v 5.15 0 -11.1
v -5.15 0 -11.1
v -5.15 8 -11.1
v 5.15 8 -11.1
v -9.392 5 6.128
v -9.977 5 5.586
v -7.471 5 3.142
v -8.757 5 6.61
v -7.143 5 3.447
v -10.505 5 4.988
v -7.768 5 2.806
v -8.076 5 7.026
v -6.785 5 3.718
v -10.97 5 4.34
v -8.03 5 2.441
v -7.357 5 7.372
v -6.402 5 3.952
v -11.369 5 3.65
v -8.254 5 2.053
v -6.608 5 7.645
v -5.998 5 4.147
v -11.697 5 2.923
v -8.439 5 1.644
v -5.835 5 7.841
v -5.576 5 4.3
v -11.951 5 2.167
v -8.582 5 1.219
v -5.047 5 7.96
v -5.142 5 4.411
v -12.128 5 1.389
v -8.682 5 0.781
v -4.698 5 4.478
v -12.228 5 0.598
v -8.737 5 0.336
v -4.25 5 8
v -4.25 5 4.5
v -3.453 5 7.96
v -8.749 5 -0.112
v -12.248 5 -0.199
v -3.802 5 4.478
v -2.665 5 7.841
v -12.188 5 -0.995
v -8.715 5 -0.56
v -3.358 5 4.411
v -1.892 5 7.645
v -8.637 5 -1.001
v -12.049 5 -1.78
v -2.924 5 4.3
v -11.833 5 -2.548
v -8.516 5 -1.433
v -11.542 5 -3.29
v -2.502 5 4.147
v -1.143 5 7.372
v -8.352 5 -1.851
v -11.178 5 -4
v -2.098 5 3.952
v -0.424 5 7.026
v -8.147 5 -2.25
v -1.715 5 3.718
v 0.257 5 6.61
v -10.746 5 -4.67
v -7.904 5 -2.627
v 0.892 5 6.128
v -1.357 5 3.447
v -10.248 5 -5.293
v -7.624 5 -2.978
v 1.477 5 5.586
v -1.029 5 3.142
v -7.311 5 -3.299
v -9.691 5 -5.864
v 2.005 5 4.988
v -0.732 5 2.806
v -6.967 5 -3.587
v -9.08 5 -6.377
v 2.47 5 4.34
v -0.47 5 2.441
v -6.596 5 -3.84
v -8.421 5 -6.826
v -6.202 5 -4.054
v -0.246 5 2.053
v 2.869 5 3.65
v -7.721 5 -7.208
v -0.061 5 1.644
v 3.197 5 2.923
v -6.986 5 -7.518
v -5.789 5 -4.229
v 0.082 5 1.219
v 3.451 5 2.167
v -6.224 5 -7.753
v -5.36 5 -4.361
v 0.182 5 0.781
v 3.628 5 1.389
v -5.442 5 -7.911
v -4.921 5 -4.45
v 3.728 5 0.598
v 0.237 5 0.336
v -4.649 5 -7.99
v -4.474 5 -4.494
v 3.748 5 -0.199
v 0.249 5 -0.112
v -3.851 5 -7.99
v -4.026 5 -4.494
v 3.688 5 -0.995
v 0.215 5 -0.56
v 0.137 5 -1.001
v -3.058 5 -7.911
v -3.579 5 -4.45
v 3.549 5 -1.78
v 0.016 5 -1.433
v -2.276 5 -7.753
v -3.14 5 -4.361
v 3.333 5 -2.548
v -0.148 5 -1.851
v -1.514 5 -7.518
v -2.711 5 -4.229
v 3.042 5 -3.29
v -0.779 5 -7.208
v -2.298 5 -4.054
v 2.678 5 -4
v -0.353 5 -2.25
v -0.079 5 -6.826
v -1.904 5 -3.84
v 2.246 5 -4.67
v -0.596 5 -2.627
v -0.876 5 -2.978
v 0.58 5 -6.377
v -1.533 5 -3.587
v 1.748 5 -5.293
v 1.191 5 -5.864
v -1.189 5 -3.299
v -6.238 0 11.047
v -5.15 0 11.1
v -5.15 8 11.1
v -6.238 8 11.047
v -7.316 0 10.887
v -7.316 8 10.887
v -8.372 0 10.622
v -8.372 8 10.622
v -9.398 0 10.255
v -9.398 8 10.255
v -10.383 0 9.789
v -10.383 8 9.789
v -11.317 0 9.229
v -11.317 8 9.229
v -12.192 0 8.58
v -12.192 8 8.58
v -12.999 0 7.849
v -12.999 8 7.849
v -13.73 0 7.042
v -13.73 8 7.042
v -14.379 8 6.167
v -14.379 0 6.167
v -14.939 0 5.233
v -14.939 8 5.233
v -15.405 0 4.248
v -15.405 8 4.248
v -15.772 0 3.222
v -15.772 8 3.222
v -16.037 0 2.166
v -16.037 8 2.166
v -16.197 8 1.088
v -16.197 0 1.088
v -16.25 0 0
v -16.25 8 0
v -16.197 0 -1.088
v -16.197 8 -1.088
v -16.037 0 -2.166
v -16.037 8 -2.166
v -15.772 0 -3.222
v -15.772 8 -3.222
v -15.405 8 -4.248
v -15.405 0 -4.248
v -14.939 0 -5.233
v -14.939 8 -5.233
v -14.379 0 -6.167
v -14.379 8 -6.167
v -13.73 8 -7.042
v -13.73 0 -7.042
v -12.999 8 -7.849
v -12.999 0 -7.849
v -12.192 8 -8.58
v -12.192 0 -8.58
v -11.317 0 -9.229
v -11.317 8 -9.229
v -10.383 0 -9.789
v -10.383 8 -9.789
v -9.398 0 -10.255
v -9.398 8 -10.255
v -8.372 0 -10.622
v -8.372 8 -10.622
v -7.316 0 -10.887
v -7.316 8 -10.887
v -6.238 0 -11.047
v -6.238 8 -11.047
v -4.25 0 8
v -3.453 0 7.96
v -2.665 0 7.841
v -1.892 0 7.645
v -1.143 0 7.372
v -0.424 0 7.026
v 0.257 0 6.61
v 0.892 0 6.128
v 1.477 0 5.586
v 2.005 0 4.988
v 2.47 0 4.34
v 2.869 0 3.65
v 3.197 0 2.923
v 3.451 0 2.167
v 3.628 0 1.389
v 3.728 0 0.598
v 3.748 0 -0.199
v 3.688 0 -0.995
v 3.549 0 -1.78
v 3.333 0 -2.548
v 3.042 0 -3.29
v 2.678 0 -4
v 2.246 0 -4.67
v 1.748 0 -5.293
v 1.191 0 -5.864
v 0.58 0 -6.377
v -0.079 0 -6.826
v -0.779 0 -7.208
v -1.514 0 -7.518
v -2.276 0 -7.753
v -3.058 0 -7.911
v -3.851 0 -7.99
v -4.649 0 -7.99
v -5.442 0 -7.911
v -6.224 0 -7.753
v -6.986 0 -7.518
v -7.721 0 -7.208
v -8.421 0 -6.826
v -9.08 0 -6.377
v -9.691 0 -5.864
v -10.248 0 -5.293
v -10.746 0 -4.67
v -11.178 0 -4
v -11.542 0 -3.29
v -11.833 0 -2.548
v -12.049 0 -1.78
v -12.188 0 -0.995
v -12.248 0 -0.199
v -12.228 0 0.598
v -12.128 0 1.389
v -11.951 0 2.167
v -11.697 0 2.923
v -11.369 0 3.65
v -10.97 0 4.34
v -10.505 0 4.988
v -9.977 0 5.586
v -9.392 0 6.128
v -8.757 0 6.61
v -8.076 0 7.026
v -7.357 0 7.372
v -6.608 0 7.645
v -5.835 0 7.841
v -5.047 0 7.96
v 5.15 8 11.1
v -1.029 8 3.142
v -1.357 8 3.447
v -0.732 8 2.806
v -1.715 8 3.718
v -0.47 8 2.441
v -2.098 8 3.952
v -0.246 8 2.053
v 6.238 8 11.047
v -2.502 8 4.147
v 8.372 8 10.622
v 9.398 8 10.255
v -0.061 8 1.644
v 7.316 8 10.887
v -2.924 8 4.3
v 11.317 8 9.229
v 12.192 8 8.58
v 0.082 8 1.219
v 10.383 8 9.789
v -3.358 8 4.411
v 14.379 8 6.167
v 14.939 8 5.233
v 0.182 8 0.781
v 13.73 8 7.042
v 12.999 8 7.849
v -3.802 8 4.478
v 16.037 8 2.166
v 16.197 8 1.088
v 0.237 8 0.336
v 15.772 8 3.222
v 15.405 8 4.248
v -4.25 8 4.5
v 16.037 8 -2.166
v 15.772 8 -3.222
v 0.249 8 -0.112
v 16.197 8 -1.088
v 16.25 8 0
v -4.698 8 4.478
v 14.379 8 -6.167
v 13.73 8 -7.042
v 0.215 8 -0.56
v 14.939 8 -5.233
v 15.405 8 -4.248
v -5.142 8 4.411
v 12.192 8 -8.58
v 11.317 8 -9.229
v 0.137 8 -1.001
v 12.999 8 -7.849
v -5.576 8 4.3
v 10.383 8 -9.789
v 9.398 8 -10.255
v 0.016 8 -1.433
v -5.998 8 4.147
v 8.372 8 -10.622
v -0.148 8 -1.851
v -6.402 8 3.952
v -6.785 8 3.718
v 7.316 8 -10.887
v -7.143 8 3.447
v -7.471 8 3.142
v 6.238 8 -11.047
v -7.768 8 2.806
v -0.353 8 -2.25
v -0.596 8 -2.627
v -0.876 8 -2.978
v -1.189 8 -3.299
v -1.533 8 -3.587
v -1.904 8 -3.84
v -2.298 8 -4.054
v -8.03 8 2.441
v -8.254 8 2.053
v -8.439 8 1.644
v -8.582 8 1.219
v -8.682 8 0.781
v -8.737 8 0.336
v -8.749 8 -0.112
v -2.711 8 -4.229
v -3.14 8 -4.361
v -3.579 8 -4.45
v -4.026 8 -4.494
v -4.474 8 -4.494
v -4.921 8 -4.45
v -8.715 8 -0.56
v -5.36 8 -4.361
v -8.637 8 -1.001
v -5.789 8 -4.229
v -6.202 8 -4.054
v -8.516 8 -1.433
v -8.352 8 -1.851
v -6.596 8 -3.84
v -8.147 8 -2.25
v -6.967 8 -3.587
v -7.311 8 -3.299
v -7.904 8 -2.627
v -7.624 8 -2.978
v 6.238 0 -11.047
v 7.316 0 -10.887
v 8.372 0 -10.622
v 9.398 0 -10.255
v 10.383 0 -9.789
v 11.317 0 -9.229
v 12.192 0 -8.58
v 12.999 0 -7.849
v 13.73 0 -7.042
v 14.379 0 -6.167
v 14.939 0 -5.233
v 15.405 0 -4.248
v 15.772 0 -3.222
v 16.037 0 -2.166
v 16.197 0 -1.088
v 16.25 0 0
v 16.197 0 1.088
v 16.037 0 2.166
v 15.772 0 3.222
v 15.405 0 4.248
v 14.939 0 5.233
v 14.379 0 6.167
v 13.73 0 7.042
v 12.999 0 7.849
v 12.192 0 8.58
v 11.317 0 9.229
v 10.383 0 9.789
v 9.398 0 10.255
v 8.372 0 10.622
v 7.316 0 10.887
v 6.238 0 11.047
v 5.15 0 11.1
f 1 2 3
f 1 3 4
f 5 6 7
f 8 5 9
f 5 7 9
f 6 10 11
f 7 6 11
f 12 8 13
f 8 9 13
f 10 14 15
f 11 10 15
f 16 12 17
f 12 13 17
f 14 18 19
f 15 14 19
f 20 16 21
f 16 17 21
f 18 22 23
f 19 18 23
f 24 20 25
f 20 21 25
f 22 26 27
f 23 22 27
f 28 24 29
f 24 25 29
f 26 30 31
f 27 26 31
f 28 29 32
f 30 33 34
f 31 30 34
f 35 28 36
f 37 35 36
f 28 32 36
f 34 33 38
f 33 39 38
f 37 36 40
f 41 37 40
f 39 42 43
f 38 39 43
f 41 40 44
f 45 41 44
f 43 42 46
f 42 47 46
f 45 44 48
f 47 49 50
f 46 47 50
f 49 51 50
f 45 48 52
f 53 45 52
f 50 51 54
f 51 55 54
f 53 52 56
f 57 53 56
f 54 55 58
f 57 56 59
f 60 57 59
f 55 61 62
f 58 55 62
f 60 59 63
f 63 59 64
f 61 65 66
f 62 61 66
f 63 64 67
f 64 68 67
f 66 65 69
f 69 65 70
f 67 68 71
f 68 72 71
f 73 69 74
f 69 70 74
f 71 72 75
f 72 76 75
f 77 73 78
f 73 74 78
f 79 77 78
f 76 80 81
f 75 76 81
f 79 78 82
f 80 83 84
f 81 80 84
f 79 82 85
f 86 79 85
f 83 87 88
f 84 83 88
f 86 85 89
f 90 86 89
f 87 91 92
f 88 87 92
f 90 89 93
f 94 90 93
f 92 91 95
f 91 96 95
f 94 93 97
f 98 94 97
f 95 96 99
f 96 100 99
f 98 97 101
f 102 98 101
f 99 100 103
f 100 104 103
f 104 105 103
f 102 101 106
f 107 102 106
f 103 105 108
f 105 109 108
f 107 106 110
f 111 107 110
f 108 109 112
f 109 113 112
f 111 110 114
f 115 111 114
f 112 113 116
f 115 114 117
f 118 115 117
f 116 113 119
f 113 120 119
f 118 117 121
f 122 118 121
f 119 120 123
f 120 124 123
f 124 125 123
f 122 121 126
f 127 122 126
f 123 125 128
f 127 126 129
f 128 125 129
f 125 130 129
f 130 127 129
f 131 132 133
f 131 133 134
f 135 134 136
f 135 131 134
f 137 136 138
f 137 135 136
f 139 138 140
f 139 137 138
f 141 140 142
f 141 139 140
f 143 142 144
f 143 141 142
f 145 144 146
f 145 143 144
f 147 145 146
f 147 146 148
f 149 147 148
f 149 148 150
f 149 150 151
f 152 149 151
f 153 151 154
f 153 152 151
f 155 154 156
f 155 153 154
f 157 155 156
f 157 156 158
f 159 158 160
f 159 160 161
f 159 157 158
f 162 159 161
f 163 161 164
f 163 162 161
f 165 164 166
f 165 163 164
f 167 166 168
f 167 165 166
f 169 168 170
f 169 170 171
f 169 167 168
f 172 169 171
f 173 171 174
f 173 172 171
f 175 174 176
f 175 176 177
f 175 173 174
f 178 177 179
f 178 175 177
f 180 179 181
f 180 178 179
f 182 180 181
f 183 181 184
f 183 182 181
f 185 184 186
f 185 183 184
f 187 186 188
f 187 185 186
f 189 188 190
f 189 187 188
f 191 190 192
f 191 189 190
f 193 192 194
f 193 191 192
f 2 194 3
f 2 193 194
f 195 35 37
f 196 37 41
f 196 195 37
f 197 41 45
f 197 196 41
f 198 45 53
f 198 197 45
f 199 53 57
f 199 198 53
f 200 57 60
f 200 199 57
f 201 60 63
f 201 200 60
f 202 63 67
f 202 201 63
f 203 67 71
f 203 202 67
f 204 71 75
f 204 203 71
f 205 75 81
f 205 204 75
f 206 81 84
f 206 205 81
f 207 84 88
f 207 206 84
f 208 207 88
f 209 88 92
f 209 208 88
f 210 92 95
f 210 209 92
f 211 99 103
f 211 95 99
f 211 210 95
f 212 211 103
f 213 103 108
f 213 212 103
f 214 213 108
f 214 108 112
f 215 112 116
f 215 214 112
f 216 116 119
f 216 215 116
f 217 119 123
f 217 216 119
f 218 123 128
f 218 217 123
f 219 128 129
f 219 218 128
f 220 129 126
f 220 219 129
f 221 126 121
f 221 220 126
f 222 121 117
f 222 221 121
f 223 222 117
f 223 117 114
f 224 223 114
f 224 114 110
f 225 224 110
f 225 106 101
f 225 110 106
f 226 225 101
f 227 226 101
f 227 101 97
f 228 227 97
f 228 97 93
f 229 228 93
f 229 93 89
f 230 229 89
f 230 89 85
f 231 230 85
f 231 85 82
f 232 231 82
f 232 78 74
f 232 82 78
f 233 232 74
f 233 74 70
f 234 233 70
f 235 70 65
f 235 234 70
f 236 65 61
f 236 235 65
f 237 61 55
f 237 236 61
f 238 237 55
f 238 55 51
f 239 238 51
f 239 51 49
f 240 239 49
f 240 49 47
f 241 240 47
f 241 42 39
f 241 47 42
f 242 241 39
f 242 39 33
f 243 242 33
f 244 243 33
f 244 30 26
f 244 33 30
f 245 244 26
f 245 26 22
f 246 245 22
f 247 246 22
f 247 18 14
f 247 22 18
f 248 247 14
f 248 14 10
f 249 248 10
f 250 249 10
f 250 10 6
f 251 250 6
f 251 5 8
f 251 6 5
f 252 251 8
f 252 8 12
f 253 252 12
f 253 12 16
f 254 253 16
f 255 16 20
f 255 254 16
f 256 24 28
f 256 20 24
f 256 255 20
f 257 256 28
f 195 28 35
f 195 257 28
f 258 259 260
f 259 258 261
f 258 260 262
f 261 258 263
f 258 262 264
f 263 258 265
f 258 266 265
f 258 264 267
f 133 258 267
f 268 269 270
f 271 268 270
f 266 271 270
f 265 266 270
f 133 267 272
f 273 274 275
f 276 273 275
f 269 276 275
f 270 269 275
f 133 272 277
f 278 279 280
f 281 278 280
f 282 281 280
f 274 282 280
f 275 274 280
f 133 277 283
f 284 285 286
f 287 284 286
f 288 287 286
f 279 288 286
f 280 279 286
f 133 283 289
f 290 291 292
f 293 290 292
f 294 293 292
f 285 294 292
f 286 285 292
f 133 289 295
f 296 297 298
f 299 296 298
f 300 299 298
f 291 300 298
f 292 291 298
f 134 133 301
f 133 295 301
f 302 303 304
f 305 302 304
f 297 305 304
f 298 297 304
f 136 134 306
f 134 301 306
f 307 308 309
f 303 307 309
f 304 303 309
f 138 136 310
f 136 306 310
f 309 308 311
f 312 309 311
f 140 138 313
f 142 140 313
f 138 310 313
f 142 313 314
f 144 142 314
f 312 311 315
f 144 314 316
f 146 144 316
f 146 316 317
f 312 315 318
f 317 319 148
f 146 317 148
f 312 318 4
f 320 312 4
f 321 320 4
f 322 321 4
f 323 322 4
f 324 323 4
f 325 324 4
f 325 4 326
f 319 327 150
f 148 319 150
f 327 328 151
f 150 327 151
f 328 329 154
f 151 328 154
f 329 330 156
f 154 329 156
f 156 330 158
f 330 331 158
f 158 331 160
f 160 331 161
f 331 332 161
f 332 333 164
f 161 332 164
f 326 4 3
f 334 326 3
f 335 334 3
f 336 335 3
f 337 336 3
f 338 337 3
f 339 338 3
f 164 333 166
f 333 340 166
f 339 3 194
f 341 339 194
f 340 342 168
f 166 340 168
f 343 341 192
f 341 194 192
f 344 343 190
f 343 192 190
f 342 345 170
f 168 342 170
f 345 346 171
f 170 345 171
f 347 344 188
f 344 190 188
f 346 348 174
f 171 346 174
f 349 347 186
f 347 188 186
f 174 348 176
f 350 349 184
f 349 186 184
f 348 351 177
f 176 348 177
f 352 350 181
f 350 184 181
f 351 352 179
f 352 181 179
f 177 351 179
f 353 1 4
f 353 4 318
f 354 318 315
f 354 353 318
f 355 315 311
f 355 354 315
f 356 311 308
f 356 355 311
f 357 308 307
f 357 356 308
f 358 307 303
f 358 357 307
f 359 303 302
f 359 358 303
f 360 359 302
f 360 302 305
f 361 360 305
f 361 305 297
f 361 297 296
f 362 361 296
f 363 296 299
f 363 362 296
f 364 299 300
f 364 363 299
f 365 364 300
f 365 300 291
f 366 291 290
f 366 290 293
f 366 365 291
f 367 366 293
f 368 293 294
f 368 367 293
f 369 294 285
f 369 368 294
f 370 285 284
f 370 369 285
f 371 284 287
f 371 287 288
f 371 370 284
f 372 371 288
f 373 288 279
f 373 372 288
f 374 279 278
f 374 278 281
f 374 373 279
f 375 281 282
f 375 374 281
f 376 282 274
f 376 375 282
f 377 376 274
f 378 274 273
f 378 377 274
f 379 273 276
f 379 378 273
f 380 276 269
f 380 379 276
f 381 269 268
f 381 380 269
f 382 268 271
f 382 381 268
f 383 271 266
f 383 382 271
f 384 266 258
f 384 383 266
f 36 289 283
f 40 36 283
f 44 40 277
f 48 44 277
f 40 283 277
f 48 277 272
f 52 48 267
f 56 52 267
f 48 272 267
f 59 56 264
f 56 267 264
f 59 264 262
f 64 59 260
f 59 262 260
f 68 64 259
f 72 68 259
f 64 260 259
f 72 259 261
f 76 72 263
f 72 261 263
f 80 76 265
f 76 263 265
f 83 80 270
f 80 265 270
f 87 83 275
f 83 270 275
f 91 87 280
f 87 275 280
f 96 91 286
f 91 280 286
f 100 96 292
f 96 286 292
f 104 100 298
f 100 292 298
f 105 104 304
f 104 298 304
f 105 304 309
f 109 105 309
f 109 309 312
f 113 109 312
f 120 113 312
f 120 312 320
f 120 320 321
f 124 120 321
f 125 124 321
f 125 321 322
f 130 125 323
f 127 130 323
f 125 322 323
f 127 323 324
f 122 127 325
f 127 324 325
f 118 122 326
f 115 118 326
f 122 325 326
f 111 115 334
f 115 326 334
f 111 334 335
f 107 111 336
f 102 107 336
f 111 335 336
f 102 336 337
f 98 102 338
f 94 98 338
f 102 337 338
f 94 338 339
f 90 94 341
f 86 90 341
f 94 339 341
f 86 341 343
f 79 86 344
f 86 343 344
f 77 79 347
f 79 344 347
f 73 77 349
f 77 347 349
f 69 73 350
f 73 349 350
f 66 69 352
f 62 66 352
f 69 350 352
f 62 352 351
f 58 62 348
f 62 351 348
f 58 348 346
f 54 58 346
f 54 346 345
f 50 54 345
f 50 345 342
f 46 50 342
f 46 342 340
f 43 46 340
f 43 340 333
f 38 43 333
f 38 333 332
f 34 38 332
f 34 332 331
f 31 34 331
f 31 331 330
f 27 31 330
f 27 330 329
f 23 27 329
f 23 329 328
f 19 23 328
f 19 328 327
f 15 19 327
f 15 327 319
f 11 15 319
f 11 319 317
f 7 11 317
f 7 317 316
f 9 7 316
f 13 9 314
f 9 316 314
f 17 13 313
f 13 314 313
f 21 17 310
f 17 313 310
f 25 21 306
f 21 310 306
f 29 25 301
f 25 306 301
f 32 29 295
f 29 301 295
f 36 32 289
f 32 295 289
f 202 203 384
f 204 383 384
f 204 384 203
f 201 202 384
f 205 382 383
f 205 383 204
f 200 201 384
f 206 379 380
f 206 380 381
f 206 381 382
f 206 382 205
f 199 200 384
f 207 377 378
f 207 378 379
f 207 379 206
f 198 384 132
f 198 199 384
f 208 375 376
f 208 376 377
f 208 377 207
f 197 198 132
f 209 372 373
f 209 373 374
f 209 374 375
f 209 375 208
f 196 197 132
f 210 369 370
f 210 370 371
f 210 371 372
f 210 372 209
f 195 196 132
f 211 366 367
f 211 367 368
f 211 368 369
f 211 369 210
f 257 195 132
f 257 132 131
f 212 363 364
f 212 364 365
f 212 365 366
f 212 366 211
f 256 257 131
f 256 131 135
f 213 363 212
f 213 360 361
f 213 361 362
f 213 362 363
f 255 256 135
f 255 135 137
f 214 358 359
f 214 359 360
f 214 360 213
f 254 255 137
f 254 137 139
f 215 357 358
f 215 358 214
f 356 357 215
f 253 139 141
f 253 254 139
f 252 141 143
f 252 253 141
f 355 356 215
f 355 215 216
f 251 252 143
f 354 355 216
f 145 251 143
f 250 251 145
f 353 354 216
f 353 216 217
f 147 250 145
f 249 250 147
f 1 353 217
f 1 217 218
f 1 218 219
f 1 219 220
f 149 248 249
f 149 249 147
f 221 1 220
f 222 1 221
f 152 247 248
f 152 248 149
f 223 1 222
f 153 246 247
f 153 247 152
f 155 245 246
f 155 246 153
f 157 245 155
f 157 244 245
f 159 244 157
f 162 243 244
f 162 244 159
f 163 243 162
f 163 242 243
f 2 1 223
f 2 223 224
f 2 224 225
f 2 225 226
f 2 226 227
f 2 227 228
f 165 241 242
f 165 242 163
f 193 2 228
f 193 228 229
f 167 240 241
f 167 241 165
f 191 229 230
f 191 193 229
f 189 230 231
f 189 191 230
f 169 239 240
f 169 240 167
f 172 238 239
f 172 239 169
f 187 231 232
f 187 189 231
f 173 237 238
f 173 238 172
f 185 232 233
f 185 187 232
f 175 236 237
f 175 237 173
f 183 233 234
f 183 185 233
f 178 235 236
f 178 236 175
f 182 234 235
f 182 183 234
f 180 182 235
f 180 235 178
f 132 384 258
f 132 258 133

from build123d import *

# Parameters (mm, degrees)
SKETCH1_R           = 8
BOSS_EXTRUDE1_DEPTH = 8
SKETCH2_R           = 8.214701508
SKETCH2_R_2         = 4.5
BOSS_EXTRUDE2_DEPTH = 3


with BuildPart() as part:
    # Sketch1 → Boss-Extrude1 (new body)
    with BuildSketch(Plane(origin=(0, 0, 0), x_dir=(1, 0, 0), z_dir=(0, 1, 0))):
        with BuildLine():
            Line((-5.15, 11.1), (5.15, 11.1))
            ThreePointArc((5.15, 11.1), (16.25, 0), (5.15, -11.1))
            Line((5.15, -11.1), (-5.15, -11.1))
            ThreePointArc((-5.15, -11.1), (-16.25, 0), (-5.15, 11.1))
        make_face()
        with Locations(Location((-4.25, 0, 0), (0, 0, 270))):
            Circle(SKETCH1_R, mode=Mode.SUBTRACT)
    extrude(amount=BOSS_EXTRUDE1_DEPTH)

    # Sketch2 → Boss-Extrude2 (add)
    with BuildSketch(Plane(origin=(0, 8, 0), x_dir=(1, 0, 0), z_dir=(0, 1, 0))):
        with Locations((-4.25, 0)):
            Circle(SKETCH2_R)
        with Locations(Location((-4.25, 0, 0), (0, 0, 270))):
            Circle(SKETCH2_R_2, mode=Mode.SUBTRACT)
    extrude(amount=-BOSS_EXTRUDE2_DEPTH)


solid = part.part
